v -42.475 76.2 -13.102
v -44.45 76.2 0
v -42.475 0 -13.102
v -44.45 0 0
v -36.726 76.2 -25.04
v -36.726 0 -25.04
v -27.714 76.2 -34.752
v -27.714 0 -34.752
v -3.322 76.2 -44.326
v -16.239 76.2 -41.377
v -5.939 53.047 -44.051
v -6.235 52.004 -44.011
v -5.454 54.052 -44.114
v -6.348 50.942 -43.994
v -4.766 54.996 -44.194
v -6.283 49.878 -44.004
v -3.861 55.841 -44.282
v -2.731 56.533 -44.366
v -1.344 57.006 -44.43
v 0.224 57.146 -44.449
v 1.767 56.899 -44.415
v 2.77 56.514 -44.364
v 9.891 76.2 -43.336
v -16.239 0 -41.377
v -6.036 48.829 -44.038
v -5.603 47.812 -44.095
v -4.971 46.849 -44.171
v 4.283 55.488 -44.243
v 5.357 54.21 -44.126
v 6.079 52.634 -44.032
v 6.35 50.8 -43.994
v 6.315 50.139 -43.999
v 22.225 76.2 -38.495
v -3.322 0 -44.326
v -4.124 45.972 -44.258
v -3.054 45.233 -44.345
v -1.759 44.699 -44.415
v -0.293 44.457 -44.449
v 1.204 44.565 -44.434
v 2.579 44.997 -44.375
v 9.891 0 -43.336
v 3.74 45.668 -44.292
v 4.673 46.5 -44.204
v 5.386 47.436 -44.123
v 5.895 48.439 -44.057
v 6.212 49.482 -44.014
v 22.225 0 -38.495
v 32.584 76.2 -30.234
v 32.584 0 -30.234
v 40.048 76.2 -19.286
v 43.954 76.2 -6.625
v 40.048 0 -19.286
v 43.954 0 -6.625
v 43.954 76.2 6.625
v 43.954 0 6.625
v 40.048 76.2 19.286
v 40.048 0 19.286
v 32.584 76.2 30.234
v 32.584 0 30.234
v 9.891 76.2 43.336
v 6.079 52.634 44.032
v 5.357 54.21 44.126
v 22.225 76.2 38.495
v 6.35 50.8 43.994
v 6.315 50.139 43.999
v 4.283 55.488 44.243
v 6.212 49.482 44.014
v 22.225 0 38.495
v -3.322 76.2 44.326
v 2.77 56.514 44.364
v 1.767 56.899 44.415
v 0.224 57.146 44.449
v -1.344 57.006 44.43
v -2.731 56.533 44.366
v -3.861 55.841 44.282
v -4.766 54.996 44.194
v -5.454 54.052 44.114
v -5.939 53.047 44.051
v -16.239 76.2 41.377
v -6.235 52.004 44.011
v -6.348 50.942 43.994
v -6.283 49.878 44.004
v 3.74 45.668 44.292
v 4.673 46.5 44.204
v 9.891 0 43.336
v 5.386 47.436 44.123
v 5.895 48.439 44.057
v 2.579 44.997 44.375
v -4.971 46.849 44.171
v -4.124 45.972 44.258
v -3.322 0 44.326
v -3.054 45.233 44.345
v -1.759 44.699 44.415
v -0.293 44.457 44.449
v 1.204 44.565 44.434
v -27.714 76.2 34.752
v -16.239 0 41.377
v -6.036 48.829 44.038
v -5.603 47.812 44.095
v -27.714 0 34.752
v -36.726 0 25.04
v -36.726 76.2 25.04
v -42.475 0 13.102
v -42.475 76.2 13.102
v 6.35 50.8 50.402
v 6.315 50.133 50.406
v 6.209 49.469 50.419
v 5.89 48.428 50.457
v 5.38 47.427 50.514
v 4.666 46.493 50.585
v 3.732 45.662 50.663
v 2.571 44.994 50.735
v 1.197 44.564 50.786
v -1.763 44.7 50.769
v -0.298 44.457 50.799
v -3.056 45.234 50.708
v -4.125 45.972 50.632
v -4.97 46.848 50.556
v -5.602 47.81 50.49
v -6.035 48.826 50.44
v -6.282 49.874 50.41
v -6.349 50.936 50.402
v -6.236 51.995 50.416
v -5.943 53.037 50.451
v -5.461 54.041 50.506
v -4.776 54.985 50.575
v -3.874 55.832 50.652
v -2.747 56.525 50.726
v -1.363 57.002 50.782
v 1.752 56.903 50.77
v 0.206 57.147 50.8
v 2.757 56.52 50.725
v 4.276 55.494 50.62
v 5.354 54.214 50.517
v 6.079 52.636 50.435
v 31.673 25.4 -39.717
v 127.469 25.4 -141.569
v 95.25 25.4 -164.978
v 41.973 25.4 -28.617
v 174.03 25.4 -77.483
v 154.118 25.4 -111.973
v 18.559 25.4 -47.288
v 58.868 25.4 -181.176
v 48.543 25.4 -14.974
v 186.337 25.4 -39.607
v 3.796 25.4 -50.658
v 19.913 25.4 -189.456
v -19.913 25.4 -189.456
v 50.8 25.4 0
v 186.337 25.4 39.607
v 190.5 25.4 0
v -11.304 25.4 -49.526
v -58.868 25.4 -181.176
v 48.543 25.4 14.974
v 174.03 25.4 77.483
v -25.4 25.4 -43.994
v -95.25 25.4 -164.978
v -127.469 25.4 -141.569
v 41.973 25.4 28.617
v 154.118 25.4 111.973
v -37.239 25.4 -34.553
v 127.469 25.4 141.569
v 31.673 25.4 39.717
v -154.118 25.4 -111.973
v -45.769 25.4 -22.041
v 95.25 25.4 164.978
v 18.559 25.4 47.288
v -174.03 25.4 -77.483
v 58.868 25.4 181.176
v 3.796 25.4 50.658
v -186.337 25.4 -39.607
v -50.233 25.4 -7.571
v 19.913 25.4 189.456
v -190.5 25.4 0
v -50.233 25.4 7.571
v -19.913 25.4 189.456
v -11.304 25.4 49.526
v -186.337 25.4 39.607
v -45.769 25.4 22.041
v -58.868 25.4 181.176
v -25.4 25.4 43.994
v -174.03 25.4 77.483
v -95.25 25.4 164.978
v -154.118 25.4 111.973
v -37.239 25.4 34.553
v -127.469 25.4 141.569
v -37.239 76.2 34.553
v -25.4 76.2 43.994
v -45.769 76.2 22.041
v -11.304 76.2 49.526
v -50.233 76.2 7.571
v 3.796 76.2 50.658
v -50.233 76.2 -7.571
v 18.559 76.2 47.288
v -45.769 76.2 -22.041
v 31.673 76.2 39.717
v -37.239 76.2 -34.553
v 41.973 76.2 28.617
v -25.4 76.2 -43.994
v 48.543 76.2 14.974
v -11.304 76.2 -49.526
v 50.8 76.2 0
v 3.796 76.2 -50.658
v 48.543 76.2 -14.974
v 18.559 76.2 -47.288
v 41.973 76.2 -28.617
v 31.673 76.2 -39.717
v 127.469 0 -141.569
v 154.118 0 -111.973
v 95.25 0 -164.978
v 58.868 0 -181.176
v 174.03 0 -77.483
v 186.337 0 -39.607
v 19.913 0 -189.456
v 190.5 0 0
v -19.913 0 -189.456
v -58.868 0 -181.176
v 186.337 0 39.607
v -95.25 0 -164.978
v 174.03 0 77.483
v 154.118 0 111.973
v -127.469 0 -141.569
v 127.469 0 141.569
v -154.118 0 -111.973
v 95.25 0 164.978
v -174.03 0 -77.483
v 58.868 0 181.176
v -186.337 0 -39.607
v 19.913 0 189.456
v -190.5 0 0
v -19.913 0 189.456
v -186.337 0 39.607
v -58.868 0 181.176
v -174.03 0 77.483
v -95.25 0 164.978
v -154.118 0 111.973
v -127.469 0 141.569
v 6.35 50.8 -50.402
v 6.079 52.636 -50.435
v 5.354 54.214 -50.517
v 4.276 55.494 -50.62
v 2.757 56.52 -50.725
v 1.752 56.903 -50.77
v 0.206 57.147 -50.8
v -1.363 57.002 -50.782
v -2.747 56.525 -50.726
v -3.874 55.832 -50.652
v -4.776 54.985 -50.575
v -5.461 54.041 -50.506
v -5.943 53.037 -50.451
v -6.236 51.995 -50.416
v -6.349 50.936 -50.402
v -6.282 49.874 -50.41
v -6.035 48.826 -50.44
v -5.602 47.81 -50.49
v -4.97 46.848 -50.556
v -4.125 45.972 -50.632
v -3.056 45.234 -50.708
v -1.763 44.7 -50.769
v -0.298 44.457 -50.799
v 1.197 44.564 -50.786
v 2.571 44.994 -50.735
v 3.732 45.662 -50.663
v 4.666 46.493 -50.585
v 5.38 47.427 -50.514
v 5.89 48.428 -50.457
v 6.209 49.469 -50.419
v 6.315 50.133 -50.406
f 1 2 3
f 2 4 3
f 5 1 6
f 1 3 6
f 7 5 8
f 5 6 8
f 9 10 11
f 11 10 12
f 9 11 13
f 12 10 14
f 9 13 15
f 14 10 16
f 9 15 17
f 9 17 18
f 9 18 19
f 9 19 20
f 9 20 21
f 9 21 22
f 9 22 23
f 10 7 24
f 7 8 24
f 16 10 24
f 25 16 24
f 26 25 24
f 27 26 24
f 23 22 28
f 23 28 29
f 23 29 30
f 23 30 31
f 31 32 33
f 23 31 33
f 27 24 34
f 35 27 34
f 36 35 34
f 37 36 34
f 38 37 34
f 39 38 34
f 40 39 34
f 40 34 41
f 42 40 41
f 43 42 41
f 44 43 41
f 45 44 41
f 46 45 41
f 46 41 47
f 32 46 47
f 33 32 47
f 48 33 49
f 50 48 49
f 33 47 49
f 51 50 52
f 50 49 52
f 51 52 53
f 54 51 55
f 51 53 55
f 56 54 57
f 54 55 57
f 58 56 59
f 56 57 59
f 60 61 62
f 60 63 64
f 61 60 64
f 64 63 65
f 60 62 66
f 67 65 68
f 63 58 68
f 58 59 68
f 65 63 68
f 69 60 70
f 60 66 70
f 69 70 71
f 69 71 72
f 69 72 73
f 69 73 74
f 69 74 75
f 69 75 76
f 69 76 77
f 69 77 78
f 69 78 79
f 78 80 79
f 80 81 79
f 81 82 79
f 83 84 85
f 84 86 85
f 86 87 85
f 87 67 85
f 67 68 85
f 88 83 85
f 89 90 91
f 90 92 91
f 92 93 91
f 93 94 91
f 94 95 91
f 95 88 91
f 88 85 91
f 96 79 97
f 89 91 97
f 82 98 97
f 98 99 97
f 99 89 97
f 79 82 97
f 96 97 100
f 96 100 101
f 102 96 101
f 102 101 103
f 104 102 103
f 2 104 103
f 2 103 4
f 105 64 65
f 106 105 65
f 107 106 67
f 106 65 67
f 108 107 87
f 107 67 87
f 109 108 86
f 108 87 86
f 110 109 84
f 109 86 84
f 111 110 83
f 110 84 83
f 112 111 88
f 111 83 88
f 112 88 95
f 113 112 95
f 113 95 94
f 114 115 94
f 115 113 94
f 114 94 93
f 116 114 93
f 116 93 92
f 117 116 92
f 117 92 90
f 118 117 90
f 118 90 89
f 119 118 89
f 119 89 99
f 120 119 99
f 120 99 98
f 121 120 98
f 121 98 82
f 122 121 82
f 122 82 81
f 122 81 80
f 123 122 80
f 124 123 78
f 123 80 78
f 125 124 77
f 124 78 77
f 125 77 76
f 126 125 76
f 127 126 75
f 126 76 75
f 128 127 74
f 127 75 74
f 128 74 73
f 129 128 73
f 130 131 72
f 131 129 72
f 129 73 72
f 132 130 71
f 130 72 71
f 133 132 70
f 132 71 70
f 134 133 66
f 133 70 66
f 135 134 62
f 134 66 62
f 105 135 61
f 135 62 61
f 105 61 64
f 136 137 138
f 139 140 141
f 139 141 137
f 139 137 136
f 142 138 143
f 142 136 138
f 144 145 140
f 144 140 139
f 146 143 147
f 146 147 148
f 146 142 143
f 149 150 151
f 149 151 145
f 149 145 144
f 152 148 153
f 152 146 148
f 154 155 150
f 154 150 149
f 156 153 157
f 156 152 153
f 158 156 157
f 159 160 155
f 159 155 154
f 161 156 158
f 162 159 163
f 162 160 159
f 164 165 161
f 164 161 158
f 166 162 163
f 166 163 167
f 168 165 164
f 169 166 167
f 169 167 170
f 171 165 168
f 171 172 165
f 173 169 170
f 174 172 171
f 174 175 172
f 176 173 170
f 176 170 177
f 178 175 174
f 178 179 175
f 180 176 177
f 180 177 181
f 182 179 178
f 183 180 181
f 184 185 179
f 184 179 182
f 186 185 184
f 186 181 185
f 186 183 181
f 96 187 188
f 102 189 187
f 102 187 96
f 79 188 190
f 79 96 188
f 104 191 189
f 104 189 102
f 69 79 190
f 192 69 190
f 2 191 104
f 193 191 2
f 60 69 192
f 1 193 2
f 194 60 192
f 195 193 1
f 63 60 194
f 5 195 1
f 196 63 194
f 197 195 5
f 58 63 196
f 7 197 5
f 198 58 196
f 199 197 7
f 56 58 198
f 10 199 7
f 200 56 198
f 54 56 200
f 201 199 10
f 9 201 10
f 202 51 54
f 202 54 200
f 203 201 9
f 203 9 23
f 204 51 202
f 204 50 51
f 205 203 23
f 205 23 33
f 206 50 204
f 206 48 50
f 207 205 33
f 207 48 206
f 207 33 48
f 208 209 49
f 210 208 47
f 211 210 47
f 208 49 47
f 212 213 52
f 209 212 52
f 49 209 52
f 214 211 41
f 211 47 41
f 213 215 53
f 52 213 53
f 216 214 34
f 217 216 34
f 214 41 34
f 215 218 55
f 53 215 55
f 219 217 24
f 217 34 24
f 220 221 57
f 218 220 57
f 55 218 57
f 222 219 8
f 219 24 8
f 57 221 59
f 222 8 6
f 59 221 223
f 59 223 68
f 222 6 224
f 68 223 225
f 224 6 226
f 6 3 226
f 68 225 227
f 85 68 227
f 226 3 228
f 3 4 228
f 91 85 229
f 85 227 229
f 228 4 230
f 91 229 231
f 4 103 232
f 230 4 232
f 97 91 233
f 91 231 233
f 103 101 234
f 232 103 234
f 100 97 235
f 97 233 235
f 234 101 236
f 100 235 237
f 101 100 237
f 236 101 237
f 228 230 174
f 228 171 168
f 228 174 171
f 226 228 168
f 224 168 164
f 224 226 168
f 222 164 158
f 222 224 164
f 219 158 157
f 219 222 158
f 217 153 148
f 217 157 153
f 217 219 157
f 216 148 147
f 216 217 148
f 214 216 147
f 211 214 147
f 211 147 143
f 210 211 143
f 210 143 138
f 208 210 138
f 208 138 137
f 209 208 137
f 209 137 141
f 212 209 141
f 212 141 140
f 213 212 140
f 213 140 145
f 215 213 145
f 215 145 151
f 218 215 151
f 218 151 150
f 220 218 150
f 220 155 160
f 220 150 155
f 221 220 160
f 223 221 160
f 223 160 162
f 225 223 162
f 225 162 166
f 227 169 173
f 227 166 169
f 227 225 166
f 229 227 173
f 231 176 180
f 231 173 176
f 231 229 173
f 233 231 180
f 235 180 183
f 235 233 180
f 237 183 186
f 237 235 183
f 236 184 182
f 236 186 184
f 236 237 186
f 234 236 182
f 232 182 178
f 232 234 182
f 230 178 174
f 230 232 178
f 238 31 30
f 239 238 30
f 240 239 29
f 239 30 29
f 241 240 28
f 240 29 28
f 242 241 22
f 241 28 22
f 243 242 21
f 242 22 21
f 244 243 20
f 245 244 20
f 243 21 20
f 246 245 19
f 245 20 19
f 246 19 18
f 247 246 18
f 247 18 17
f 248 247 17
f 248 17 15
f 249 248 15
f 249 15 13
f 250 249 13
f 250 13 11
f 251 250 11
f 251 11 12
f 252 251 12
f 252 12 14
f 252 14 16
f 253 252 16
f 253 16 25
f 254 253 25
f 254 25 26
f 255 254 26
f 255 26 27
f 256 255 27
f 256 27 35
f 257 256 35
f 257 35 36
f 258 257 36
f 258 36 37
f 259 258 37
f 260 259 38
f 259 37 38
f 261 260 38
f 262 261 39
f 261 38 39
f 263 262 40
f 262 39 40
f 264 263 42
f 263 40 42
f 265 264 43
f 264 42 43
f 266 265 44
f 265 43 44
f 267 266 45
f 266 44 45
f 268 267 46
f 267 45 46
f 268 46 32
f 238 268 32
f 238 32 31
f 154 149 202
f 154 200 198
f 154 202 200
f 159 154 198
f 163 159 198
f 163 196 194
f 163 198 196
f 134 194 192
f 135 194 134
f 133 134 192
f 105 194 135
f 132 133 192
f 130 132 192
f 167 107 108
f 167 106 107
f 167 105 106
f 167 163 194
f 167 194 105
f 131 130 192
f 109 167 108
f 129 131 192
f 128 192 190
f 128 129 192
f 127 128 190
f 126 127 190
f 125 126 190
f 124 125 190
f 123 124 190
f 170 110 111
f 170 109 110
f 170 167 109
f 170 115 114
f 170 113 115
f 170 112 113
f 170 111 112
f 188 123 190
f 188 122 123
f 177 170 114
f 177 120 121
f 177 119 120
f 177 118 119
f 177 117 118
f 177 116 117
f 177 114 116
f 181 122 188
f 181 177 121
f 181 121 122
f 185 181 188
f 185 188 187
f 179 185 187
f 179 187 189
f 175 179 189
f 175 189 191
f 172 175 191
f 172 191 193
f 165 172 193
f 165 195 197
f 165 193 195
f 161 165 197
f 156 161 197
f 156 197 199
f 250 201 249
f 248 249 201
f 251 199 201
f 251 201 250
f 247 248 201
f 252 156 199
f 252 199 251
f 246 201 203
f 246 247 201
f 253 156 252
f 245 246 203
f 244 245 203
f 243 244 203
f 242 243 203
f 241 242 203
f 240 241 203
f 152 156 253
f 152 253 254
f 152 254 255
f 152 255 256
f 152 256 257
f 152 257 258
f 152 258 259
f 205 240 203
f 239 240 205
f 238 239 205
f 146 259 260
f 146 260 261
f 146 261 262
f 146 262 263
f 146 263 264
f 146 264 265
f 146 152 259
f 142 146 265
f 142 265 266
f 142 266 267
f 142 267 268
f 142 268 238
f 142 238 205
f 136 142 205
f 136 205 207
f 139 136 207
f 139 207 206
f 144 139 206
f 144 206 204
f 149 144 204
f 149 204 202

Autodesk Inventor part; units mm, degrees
ref_plane "YZ Plane" through (0, 0, 0) normal (1, 0, 0) x (0, 1, 0)
ref_plane "XZ Plane" through (0, 0, 0) normal (0, 1, 0) x (-1, 0, 0)
ref_plane "XY Plane" through (0, 0, 0) normal (0, 0, 1) x (1, 0, 0)
sketch "Sketch1" plane through (0, 0, 0) normal (0, 1, 0) x (-1, 0, 0)
  circle A0 centre (0, 0) radius 190.5
  dimension "d0" = 381
extrude "Extrusion1" add sketch "Sketch1" along normal blind 25.4
sketch "Sketch2" plane through (0, 25.4, 0) normal (0, 1, 0) x (1, 0, 0)
  circle A0 centre (0, 0) radius 50.8
  dimension "d3" = 101.6
extrude "Extrusion2" add sketch "Sketch2" along normal blind 50.8
sketch "Sketch3" plane through (0, 0, 0) normal (0, 1, 0) x (-1, 0, 0)
  circle A0 centre (0, 0) radius 44.45
  dimension "d6" = 88.9
extrude "Extrusion3" cut sketch "Sketch3" along normal up to next
sketch "Sketch4" plane through (0, 0, 0) normal (0, 0, 1) x (1, 0, 0)
  circle A0 centre (0, 50.8) radius 6.35
  line L0 (190.5, 25.4) -> (-190.5, 25.4) projected
  point P0 (0, 0)
  dimension "d9" = 12.7
  dimension "d10" = 25.4
extrude "Extrusion4" cut sketch "Sketch4" along normal mid plane 177.8
properties part number "Top3"
